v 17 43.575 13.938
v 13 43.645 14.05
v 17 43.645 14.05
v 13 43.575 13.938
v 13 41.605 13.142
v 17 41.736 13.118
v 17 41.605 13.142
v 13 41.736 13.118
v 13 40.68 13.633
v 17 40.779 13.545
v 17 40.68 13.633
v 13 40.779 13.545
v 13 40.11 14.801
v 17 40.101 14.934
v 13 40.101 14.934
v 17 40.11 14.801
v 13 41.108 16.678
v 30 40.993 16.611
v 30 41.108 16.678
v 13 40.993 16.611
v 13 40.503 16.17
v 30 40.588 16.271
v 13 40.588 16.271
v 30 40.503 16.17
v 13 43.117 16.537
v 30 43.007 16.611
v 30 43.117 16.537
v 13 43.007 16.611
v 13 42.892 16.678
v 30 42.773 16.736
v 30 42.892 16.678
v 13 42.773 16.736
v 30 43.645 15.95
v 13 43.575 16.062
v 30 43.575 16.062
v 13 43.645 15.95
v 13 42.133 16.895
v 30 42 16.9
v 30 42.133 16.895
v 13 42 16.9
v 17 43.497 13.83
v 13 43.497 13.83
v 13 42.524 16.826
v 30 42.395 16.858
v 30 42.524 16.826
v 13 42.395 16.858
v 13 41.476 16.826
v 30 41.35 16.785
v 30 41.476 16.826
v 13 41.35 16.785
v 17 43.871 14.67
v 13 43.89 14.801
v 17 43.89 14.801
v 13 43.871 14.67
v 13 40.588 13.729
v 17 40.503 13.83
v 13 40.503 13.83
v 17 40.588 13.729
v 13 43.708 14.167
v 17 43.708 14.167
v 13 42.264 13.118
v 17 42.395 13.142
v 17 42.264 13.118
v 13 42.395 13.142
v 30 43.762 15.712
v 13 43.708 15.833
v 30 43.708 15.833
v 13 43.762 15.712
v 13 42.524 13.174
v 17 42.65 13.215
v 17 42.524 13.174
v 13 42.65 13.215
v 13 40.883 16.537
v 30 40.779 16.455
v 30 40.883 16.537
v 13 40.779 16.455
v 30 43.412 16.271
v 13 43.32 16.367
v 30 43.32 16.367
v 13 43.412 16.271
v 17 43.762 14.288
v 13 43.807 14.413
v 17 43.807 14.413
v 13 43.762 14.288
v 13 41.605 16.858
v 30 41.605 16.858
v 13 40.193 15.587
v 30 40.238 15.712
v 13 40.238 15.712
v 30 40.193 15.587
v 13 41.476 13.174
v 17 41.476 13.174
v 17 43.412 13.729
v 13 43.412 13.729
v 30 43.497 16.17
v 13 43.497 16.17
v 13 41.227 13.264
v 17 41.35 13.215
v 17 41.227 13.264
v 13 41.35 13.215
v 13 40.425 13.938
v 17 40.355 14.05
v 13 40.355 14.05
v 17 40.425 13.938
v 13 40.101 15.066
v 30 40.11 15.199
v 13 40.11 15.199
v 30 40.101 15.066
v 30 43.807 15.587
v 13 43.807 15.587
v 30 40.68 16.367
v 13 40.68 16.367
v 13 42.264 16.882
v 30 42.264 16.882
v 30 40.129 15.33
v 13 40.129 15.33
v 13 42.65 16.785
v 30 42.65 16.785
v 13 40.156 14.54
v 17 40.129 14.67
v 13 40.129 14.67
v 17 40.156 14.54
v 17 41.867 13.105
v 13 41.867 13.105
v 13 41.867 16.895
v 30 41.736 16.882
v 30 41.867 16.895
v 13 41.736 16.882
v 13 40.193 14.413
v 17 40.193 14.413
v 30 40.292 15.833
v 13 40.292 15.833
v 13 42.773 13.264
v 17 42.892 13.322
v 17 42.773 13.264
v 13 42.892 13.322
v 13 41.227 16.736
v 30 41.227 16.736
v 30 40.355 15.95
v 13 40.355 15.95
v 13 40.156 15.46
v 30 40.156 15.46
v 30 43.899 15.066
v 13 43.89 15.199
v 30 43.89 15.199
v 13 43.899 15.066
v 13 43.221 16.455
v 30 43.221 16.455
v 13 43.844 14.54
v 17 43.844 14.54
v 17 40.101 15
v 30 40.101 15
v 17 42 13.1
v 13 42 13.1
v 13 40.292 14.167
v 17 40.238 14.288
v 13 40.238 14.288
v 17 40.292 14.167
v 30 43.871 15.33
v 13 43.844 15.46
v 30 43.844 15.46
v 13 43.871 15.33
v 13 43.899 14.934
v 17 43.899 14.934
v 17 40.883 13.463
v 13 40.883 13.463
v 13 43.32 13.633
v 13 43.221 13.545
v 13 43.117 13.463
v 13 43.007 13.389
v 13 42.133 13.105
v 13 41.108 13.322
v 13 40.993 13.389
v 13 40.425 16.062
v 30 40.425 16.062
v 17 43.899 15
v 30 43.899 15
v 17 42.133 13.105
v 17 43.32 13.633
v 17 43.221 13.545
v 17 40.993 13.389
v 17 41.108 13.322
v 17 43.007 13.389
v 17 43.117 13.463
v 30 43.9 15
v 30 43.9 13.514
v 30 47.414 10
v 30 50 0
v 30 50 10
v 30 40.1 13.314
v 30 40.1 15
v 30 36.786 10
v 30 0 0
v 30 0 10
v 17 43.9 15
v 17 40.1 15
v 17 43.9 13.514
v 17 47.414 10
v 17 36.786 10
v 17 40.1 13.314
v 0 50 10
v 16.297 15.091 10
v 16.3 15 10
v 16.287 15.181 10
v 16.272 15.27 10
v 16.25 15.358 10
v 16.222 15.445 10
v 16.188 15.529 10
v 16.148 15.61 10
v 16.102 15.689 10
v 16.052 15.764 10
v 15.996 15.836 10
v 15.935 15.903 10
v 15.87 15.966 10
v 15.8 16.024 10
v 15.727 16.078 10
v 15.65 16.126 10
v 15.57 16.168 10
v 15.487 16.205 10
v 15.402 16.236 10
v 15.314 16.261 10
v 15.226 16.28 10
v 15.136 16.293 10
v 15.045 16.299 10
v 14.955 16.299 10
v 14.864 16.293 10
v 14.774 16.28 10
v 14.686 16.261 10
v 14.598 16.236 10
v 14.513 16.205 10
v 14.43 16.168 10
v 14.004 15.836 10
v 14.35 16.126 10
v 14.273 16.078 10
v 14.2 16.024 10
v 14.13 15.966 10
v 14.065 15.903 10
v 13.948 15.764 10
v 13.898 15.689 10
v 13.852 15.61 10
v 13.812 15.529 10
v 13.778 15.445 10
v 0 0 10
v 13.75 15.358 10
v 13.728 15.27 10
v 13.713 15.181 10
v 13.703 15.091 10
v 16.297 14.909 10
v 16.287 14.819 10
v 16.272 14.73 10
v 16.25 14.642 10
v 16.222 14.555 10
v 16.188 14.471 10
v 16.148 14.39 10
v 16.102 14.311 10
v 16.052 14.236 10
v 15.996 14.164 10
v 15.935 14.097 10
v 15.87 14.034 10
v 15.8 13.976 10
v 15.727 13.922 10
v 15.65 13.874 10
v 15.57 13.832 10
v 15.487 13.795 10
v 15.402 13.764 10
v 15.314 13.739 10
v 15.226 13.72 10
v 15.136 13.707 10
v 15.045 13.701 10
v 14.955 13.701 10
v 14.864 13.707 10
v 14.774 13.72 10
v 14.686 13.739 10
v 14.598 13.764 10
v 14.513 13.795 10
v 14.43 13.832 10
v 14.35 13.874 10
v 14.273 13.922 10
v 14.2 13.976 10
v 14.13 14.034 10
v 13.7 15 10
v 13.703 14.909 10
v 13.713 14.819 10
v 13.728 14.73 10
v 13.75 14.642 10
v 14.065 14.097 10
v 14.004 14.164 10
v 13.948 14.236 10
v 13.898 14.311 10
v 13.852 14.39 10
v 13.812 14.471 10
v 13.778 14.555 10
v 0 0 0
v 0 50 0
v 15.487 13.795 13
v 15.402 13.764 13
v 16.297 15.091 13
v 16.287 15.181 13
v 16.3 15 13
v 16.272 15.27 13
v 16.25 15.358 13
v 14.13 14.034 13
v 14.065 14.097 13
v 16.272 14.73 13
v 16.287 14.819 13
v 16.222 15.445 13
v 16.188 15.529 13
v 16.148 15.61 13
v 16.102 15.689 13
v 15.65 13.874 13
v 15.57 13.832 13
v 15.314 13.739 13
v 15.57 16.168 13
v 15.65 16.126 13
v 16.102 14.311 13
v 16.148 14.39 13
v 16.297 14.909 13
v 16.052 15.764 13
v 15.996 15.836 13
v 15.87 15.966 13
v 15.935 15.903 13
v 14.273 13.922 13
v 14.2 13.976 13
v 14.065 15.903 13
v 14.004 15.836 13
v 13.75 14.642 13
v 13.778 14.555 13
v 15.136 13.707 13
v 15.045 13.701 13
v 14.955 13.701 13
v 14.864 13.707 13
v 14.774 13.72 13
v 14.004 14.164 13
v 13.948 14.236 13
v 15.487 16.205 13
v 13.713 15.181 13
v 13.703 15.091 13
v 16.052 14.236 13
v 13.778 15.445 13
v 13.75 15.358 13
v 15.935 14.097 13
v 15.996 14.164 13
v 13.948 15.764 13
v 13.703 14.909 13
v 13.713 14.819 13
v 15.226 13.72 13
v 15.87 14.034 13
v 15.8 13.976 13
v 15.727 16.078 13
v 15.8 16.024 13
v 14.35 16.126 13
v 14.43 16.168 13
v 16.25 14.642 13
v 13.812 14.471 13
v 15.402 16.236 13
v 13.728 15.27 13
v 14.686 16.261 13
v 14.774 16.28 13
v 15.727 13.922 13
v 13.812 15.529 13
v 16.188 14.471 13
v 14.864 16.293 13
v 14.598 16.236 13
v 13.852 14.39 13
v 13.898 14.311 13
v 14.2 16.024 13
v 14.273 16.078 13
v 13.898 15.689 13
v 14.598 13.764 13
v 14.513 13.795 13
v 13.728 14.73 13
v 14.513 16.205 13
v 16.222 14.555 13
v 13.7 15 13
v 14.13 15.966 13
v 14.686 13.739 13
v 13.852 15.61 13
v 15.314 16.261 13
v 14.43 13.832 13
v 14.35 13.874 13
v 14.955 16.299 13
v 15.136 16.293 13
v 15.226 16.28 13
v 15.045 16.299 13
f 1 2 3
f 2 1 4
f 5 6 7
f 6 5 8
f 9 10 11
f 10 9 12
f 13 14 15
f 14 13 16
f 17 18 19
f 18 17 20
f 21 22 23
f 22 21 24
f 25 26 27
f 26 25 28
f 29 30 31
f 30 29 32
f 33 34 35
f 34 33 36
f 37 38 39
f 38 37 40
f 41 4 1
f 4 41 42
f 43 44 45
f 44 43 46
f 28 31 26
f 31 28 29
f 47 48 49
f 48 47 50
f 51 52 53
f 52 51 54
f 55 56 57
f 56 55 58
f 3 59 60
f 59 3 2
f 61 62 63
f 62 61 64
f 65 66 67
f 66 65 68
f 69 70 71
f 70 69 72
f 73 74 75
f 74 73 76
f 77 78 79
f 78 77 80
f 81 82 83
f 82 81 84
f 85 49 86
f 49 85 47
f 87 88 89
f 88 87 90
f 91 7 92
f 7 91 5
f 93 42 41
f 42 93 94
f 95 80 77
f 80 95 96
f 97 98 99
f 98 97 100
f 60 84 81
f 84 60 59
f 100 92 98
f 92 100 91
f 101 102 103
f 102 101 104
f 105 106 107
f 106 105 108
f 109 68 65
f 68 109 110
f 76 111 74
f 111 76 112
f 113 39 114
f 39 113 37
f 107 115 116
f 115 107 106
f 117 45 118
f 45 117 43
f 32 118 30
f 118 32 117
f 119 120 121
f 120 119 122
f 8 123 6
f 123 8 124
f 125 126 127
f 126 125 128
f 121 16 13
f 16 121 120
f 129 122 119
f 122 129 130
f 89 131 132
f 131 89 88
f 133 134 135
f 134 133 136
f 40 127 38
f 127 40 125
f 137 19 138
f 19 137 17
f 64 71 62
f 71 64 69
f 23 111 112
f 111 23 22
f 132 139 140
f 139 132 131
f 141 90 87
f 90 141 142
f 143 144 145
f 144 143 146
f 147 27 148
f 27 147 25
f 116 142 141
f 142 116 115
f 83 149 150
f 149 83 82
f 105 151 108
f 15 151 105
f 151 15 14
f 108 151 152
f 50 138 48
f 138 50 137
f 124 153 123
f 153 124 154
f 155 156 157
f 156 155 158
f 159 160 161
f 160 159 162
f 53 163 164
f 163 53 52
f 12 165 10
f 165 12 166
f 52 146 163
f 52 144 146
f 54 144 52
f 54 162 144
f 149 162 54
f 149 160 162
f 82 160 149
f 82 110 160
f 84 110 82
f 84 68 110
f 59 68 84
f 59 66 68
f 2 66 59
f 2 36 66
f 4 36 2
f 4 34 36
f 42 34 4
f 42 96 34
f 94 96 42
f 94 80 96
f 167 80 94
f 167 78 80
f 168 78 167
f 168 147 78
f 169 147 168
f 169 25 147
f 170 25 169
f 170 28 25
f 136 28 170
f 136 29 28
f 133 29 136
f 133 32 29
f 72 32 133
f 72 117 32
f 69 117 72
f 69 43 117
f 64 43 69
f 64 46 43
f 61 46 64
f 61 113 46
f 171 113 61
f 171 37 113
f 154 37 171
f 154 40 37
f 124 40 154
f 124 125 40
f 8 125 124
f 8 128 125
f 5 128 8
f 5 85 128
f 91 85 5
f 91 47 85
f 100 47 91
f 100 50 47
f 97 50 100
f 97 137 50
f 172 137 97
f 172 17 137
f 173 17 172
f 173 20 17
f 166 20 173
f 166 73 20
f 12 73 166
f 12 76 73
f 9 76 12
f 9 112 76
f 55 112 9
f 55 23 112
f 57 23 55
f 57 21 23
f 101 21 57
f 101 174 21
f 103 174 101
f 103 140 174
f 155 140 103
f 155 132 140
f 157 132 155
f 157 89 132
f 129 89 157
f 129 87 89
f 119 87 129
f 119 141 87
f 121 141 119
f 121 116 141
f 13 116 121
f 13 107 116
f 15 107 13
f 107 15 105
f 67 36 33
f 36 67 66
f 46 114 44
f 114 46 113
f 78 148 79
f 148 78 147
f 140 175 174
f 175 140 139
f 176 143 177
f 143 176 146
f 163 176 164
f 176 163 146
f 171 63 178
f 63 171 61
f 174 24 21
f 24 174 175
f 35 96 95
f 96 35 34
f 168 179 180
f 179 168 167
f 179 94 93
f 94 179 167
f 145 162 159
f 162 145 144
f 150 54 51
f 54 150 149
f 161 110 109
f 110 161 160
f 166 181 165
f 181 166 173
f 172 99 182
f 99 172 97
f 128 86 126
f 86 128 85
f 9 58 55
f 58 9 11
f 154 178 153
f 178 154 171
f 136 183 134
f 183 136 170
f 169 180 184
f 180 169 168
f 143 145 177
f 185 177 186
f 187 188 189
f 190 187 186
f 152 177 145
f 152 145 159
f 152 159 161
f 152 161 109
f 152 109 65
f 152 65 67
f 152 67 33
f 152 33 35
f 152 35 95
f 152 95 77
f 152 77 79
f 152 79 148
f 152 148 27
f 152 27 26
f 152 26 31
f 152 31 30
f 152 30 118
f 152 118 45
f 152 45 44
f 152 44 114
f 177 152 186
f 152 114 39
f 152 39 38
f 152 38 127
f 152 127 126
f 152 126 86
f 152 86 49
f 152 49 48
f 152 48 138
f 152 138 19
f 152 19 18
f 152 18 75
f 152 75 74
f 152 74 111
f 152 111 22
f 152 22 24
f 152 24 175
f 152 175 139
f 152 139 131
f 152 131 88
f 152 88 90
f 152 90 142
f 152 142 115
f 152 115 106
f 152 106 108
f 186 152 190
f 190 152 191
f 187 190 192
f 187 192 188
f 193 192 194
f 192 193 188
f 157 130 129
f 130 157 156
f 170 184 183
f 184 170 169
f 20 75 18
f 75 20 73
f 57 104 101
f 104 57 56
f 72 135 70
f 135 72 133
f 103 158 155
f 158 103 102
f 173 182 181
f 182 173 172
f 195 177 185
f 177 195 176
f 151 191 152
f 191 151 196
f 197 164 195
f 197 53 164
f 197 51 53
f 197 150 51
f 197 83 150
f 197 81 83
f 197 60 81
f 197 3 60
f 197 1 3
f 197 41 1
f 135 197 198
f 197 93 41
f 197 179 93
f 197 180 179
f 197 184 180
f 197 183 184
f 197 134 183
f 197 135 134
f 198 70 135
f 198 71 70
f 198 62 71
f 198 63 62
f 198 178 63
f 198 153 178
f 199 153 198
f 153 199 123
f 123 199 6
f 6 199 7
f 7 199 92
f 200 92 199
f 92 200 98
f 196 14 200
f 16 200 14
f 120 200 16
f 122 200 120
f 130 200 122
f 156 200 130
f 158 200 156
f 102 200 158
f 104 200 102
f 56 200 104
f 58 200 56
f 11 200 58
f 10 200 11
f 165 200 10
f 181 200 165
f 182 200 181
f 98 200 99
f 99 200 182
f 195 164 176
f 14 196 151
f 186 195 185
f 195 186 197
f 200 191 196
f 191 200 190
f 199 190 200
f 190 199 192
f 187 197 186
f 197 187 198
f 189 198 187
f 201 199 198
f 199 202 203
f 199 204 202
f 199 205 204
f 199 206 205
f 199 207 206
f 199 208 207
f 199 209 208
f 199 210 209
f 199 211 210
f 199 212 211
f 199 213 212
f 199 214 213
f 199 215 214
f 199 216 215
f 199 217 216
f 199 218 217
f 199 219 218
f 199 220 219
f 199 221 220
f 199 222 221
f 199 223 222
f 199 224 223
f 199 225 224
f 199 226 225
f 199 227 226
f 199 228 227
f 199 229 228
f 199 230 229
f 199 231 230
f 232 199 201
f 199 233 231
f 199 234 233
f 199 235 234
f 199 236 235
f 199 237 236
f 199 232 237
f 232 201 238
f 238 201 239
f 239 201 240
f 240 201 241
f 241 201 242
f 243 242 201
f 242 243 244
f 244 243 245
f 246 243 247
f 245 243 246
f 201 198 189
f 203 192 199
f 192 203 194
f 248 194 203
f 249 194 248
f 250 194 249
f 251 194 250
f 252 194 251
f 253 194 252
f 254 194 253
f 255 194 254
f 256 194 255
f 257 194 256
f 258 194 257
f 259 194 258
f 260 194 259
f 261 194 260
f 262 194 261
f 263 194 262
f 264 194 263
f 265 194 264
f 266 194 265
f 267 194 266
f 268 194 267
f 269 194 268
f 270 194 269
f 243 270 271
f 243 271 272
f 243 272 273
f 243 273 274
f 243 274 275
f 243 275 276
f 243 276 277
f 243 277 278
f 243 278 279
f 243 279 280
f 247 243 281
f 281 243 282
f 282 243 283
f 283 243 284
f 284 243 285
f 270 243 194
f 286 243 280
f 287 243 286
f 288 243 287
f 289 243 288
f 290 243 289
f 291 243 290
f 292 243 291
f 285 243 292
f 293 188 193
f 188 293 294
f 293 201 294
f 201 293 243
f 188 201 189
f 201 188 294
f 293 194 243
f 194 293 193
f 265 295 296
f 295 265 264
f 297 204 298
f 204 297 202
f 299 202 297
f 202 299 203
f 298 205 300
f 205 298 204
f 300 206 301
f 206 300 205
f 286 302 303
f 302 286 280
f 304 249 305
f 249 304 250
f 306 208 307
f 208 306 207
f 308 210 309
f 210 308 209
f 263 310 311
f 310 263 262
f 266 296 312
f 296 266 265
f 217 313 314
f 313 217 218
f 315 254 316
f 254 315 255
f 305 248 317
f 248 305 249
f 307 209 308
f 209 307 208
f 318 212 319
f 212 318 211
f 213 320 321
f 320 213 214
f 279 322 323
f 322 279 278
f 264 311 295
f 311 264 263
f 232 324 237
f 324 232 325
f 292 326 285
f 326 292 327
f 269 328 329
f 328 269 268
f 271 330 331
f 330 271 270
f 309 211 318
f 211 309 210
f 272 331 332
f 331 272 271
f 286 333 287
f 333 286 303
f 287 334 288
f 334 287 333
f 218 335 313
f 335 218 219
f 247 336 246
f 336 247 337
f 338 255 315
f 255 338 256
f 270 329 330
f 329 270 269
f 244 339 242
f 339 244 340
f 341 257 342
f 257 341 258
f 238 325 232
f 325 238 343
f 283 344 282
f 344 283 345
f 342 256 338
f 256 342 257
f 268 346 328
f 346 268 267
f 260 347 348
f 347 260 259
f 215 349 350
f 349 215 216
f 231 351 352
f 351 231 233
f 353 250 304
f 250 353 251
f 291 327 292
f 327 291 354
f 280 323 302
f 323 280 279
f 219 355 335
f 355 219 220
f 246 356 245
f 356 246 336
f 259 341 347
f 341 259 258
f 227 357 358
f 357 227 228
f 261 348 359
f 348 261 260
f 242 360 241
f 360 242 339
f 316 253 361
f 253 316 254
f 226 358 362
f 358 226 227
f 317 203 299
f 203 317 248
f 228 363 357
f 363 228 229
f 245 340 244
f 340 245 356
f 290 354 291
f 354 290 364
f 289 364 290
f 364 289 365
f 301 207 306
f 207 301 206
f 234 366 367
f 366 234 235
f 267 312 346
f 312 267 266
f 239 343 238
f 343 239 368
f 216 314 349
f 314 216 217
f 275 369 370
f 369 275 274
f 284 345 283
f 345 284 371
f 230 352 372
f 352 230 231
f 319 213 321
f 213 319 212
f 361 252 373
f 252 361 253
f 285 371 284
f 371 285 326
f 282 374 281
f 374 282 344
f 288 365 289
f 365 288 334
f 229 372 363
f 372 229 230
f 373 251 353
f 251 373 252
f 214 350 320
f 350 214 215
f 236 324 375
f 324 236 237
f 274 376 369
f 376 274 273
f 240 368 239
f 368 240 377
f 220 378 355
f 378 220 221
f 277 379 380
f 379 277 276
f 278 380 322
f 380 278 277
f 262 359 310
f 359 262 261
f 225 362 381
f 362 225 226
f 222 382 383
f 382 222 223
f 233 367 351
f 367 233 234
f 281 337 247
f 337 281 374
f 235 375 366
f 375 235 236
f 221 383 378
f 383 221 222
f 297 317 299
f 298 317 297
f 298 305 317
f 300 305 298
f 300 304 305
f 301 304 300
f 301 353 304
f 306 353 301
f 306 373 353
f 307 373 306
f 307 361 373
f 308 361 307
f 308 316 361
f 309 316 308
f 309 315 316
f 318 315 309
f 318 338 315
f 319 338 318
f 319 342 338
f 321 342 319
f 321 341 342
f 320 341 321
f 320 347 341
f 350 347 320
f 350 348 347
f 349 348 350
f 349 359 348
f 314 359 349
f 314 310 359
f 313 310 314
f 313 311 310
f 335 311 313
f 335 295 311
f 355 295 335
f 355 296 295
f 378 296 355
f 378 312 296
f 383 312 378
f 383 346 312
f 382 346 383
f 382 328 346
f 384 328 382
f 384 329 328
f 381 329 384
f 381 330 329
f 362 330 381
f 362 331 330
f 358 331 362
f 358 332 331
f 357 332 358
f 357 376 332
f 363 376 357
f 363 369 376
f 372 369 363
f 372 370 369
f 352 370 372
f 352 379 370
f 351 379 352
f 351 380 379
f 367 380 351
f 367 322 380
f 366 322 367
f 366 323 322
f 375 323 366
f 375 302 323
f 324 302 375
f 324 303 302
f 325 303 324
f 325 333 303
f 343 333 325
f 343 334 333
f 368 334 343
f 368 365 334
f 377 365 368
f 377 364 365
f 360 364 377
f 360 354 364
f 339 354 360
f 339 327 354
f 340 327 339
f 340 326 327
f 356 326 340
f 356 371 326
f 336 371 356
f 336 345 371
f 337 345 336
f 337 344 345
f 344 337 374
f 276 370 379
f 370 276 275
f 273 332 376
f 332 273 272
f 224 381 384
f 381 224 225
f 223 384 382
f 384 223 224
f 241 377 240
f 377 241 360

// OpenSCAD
$fn = 90;

//!arm();
//!disk();

// body
cube([30, 50, 10]);
armMount();

// axe
translate([15, 15, 10]) cylinder(d = 2.6, h = 3);

// disk
module disk() {
    translate([-15, 15, 10]) difference() {
        cylinder(d = 18, h = 3);
        translate([0, 0, -1]) cylinder(d = 2.9, h = 6);
    }
}

// arm
module arm() {
    difference() {
        translate([0, 0, 0]) {
            translate([14, 25, 30]) rotate([0, -90, 0]) curve(2, 3, 32, 12);
            translate([16, 42, 30]) rotate([0, -90, 0]) cylinder(d = 7, h = 5);
        }
        translate([16.5, 42, 30]) rotate([0, -90, 0]) cylinder(d = 3.9, h = 5);
    }
    translate([14, 7.5, 29]) cube([2, 3.5, 2]);
    translate([15, 8.75, 27]) cube([1, 1, 2]);
}

module armMount() {
    translate([17+13, 42, 15]) rotate([0, -90, 0]) cylinder(d = 3.8, h = 4 + 13);
    translate([17, 40.1, 7]) cube([13, 3.8, 8]);
    translate([17, 42.1, 4]) rotate([45, 0, 0]) cube([13, 8, 8]);
}

module curve(width, height, length, dh) {
    r = (pow(length/2, 2) + pow(dh, 2))/(2*dh);
    a = 2*asin((length/2)/r);
    translate([-(r -dh), 0, -width/2]) rotate([0, 0, -a/2])         rotate_extrude(angle = a) translate([r, 0, 0]) square(size = [height, width], center = true);
}
